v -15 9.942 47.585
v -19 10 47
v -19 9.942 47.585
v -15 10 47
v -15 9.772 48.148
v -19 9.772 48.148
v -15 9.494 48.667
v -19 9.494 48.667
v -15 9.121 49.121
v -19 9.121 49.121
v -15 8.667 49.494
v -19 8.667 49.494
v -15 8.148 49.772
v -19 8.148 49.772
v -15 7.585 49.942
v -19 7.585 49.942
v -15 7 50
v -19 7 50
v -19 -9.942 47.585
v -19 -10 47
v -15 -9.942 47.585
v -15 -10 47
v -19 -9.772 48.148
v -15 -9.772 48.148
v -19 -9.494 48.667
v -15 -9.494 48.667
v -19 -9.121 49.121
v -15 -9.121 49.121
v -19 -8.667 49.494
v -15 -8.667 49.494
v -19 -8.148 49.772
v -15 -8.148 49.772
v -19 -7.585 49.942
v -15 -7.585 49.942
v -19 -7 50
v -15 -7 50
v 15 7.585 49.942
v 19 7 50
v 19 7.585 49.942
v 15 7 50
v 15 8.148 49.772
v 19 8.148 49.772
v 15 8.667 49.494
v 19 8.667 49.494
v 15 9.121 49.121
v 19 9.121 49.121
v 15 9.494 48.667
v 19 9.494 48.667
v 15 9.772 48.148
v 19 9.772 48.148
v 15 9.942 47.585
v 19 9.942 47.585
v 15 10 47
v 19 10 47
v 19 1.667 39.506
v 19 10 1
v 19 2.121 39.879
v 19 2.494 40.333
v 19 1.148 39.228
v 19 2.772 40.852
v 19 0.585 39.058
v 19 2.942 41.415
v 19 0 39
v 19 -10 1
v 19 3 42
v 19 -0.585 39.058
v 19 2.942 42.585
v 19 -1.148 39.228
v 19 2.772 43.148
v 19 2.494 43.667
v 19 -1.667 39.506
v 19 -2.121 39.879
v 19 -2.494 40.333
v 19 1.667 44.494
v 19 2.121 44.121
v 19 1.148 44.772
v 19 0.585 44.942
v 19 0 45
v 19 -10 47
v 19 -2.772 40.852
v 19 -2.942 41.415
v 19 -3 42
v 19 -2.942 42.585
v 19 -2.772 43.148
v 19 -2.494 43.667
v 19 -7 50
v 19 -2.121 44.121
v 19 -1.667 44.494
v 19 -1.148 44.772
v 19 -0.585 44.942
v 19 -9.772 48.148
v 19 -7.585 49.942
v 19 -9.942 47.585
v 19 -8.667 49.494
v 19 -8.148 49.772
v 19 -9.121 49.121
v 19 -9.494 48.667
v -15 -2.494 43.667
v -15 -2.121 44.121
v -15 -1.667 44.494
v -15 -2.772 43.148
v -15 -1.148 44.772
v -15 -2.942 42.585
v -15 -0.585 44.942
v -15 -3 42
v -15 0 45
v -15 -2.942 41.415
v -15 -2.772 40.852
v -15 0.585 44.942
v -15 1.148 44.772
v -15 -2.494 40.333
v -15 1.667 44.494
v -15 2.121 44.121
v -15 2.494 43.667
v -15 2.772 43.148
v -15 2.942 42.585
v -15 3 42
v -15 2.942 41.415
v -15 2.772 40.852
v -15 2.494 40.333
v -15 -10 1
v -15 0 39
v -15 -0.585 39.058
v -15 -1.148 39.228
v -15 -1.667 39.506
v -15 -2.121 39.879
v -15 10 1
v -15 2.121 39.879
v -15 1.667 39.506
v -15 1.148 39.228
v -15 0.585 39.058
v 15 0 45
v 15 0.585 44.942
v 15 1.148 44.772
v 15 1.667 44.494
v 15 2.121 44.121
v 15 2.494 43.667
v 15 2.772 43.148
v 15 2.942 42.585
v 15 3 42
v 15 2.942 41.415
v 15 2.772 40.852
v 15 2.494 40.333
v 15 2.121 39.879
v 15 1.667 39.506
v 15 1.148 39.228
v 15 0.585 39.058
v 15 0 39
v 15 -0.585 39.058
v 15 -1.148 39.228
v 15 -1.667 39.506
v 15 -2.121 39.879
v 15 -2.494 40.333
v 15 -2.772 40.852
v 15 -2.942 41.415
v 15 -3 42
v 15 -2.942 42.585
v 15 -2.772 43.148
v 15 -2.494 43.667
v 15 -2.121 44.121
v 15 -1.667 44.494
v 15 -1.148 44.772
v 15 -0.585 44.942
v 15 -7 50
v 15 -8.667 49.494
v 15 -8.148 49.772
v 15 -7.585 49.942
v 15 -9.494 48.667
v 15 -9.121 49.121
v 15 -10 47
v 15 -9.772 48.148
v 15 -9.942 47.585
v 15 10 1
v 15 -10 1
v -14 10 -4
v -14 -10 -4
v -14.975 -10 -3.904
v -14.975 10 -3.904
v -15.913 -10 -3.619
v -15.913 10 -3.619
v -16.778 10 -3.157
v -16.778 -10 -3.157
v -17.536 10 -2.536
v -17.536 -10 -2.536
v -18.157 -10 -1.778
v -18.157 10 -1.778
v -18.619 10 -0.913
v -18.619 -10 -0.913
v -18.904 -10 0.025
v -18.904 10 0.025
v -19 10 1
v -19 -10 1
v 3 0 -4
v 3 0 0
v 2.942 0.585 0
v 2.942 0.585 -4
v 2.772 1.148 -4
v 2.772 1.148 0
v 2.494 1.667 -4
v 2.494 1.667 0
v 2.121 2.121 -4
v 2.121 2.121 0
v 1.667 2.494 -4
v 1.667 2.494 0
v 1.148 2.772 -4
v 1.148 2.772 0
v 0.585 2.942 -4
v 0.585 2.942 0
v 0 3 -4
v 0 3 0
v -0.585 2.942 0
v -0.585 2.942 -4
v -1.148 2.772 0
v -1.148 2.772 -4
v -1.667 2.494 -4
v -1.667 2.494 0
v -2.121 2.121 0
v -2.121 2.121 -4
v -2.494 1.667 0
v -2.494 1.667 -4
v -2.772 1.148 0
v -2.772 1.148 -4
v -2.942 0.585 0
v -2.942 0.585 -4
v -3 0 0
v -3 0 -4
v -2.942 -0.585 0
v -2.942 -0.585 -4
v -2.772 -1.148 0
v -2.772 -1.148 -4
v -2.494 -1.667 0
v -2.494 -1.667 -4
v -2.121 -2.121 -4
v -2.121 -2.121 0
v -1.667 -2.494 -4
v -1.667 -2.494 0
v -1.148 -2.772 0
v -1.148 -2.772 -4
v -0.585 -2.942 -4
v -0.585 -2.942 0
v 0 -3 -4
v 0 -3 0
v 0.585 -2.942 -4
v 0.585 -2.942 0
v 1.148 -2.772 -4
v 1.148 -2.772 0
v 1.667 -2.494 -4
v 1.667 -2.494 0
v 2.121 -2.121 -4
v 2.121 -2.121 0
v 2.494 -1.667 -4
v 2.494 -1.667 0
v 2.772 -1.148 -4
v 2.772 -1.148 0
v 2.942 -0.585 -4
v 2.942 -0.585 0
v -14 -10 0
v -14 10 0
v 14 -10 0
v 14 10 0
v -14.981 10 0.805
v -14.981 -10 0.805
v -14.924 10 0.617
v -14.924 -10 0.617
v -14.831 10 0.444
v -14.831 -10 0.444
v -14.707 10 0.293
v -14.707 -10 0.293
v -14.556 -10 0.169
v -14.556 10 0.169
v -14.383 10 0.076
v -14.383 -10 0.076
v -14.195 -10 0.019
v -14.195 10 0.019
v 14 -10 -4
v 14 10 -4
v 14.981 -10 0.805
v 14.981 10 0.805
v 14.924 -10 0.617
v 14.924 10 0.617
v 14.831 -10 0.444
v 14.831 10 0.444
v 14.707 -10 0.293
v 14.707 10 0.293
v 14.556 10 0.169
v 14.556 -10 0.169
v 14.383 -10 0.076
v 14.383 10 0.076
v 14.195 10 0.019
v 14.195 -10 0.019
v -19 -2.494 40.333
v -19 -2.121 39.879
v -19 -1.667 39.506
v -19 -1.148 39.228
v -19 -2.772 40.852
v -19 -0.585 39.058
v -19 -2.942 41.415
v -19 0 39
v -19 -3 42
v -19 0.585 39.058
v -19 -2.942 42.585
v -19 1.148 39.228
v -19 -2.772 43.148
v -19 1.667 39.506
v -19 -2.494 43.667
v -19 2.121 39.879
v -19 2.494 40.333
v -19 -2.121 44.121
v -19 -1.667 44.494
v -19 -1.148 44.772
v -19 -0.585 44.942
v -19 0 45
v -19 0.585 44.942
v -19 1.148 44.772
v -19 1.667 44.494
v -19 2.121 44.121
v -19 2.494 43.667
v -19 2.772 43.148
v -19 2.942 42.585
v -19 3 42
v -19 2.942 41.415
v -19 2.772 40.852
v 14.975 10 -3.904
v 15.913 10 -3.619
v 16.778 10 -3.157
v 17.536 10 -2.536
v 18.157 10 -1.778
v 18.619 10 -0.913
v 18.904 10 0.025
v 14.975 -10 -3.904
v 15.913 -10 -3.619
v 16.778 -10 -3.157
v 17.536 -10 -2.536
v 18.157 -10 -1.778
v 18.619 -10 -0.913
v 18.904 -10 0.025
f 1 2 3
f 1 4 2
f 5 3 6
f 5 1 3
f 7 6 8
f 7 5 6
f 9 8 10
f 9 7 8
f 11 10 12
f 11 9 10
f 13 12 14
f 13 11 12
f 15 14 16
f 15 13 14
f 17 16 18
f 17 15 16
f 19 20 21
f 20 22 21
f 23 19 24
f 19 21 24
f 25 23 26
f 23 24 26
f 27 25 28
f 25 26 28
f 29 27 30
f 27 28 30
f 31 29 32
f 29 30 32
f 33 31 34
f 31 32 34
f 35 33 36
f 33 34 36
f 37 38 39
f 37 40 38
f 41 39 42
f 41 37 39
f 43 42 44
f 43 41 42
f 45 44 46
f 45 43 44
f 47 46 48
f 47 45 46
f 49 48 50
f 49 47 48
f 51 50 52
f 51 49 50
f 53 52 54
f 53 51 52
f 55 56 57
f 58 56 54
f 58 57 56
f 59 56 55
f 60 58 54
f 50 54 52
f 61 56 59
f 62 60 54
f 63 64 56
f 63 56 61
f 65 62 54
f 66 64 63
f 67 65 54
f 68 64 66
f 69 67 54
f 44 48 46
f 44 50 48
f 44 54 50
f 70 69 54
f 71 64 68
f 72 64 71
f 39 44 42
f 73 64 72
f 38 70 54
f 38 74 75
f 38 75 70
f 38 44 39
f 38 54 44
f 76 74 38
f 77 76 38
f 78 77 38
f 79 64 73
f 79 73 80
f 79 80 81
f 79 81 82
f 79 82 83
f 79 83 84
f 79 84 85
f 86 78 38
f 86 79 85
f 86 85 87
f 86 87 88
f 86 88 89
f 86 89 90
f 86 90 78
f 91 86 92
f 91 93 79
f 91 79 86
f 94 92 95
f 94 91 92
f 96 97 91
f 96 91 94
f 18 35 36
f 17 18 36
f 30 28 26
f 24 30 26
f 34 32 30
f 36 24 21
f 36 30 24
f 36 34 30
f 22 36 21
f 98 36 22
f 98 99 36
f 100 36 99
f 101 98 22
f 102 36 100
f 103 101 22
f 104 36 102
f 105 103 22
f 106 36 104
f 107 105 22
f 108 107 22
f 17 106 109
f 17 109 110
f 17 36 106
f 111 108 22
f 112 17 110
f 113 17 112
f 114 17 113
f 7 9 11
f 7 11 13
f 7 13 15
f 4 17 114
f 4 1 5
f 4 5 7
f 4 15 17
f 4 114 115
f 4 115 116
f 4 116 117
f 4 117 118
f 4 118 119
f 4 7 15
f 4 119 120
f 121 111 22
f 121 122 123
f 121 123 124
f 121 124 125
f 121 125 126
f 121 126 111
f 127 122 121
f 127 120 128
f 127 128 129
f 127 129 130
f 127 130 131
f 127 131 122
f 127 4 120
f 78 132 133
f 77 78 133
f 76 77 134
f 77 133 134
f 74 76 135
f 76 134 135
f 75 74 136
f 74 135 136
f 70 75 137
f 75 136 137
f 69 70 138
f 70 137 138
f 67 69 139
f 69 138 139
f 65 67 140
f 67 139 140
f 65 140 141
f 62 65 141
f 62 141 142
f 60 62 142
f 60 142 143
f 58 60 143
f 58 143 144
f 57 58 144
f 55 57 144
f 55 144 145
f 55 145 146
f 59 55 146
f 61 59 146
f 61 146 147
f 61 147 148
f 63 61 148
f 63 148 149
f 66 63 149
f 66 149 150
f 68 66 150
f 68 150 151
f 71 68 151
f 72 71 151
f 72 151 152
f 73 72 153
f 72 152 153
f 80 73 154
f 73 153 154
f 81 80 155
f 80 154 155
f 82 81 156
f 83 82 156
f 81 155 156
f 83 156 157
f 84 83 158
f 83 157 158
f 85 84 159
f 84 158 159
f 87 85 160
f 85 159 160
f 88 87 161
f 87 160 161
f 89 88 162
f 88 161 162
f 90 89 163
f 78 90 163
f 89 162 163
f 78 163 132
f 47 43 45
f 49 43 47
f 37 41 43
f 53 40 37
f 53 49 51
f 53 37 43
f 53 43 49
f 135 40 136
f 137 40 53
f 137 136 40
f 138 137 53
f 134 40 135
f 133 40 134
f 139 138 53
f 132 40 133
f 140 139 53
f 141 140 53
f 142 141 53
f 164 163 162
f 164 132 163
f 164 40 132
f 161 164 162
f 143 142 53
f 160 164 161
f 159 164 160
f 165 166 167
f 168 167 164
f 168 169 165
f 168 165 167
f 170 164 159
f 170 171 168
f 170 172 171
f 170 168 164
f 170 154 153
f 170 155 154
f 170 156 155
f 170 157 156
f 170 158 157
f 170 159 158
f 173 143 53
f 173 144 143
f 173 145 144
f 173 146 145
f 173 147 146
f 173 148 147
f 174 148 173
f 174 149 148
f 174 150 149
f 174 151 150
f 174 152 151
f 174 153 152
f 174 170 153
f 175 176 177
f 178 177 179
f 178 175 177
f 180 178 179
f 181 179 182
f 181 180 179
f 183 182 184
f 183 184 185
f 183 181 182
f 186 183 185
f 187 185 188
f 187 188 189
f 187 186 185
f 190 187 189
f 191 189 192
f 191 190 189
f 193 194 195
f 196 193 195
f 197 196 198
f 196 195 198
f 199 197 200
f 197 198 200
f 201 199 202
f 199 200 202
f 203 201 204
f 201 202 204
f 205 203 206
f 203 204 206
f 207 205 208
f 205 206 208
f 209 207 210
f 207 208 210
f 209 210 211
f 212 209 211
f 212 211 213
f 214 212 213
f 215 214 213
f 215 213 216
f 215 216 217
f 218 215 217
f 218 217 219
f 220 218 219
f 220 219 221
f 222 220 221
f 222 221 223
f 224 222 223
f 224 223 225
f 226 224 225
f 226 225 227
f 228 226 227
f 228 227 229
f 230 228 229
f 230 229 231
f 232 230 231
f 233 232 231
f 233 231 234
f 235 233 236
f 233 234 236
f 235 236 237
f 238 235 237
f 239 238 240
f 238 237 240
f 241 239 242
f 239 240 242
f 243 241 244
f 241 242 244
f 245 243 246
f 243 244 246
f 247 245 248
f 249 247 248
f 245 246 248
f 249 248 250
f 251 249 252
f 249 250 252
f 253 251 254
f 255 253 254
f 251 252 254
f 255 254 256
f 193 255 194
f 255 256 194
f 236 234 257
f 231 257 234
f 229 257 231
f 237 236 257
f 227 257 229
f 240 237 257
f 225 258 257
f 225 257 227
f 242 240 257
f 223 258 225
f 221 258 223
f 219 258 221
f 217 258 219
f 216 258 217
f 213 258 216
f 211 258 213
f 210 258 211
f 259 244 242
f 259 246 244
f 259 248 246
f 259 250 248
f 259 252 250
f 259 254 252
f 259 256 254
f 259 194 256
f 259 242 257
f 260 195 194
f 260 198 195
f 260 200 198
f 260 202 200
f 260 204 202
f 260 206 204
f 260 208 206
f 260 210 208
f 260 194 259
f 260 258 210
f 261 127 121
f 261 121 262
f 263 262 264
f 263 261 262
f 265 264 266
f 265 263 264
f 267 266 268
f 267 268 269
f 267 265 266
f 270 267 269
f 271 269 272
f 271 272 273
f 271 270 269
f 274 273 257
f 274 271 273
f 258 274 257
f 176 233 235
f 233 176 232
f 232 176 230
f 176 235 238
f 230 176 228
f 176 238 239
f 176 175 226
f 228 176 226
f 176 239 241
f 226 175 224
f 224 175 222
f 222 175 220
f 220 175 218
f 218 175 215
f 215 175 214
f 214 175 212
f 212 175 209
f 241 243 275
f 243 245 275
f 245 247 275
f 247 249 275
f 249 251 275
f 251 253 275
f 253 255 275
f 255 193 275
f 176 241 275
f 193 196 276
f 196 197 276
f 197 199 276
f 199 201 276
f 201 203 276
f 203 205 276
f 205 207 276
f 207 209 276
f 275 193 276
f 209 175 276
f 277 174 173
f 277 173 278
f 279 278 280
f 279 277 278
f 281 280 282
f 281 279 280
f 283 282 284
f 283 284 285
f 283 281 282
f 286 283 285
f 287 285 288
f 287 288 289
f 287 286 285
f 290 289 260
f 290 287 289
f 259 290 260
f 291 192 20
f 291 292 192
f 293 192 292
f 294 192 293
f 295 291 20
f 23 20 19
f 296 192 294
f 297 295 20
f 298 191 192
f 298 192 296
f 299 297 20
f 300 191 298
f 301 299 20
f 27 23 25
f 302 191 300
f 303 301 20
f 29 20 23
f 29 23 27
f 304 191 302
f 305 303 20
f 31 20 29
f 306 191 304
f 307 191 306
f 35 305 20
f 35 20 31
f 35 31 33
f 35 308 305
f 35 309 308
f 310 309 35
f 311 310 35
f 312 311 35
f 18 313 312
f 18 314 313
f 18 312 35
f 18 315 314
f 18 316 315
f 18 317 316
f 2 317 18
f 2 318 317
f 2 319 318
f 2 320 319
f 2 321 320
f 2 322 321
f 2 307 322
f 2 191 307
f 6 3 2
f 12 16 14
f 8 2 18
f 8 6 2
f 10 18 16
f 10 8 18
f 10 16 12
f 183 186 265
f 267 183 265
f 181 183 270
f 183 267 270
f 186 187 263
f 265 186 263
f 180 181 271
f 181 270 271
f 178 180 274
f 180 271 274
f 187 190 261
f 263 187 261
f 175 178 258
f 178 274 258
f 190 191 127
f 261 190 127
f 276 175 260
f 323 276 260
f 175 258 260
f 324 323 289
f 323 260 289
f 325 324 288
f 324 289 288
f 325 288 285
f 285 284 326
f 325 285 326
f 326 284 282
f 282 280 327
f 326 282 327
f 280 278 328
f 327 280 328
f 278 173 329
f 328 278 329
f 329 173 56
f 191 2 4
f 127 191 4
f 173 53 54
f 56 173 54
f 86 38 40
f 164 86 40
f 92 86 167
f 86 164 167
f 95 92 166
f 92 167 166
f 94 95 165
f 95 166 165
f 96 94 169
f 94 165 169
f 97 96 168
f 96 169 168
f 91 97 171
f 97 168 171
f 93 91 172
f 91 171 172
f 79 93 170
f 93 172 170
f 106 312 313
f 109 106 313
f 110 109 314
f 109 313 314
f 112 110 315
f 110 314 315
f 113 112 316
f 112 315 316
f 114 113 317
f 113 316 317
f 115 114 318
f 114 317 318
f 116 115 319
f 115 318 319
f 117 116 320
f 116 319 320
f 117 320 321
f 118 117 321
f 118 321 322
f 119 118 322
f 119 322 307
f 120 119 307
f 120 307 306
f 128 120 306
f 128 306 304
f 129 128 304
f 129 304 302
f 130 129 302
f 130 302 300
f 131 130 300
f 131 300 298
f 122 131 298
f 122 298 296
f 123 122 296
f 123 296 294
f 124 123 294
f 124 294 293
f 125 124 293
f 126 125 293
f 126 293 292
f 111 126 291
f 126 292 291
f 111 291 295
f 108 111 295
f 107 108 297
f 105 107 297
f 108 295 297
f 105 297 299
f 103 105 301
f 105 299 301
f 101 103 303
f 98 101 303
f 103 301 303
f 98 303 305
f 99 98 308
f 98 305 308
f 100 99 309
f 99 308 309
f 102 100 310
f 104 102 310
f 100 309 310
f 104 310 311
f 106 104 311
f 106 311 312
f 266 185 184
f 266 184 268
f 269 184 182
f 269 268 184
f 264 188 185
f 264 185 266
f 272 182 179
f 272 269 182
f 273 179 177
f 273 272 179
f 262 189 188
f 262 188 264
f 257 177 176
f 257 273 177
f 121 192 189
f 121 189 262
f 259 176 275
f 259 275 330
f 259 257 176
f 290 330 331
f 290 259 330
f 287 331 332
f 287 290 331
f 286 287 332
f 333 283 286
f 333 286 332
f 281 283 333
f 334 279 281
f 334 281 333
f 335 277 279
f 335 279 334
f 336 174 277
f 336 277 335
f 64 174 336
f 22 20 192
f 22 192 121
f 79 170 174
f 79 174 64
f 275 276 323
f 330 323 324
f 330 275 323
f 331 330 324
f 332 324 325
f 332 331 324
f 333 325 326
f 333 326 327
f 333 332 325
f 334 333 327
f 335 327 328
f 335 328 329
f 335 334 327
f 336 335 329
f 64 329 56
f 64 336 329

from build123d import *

# Parameters (mm, degrees)
SKETCH_1_W                         = 30
SKETCH_1_H                         = 20
SM_BASE_FLANGE_1_DEPTH             = 4
SM_EDGE_FLANGE_1_STRIP_W           = 18
SM_EDGE_FLANGE_1_STRIP_H           = 4
SM_EDGE_FLANGE_1_STRIP_CUT_DEPTH   = 20
SM_EDGE_FLANGE_1_STRIP_2_W         = 18
SM_EDGE_FLANGE_1_STRIP_2_H         = 4
SM_EDGE_FLANGE_1_STRIP_CUT_2_DEPTH = 20
SM_EDGE_FLANGE_1_DEPTH             = 20
SM_EDGE_FLANGE_1_BEND_DEPTH        = 20
FILLET_1_R                         = 3
SKETCH_12_R                        = 3
CUT_EXTRUDE_1_DEPTH                = 10
SKETCH_13_R                        = 3
CUT_EXTRUDE_2_DEPTH                = 64.592452382


# Sheet-metal steps are written as plain solids
with BuildPart() as part:
    # Sketch 1 → 基体-法兰1 (new body)
    with BuildSketch(Plane.XY):
        Rectangle(SKETCH_1_W, SKETCH_1_H)
    extrude(amount=-SM_BASE_FLANGE_1_DEPTH)

    # 边线-法兰1 strip (across the edge) → 边线-法兰1 strip cut (cut)
    with BuildSketch(Plane(origin=(-15, 10, 0), x_dir=(1, 0, 0), z_dir=(0, -1, 0))):
        with Locations((-8, -2)):
            Rectangle(SM_EDGE_FLANGE_1_STRIP_W, SM_EDGE_FLANGE_1_STRIP_H)
    extrude(amount=SM_EDGE_FLANGE_1_STRIP_CUT_DEPTH, mode=Mode.SUBTRACT)

    # 边线-法兰1 strip 2 (across the edge) → 边线-法兰1 strip cut 2 (cut)
    with BuildSketch(Plane(origin=(15, -10, 0), x_dir=(-1, 0, 0), z_dir=(0, 1, 0))):
        with Locations((-8, -2)):
            Rectangle(SM_EDGE_FLANGE_1_STRIP_2_W, SM_EDGE_FLANGE_1_STRIP_2_H)
    extrude(amount=SM_EDGE_FLANGE_1_STRIP_CUT_2_DEPTH, mode=Mode.SUBTRACT)

    # 边线-法兰1 section (across the edge) → 边线-法兰1 (add)
    with BuildSketch(Plane(origin=(-15, 10, 0), x_dir=(1, 0, 0), z_dir=(0, -1, 0))):
        with BuildLine():
            Line((-4, 1), (-4, 50))
            Line((-4, 50), (0, 50))
            Line((0, 50), (0, 1))
            ThreePointArc((0, 1), (0.292893219, 0.292893219), (1, 0))
            Line((1, 0), (1, -4))
            ThreePointArc((1, -4), (-2.535533906, -2.535533906), (-4, 1))
        make_face()
    extrude(amount=SM_EDGE_FLANGE_1_DEPTH)

    # 边线-法兰1 section 2 (across the edge) → 边线-法兰1 bend (add)
    with BuildSketch(Plane(origin=(15, -10, 0), x_dir=(-1, 0, 0), z_dir=(0, 1, 0))):
        with BuildLine():
            Line((-4, 1), (-4, 50))
            Line((-4, 50), (0, 50))
            Line((0, 50), (0, 1))
            ThreePointArc((0, 1), (0.292893219, 0.292893219), (1, 0))
            Line((1, 0), (1, -4))
            ThreePointArc((1, -4), (-2.535533906, -2.535533906), (-4, 1))
        make_face()
    extrude(amount=SM_EDGE_FLANGE_1_BEND_DEPTH)

    # 圆角1
    fillet_1_edges = [part.edges().sort_by_distance(p)[0] for p in [
        (-17, 10, 50),
        (-17, -10, 50),
        (17, -10, 50),
        (17, 10, 50),
    ]]
    fillet(fillet_1_edges, radius=FILLET_1_R)

    # 草图12 → 切除-拉伸1 (cut)
    with BuildSketch(Plane.XY):
        Circle(SKETCH_12_R)
    extrude(amount=-CUT_EXTRUDE_1_DEPTH, mode=Mode.SUBTRACT)

    # 草图13 → 切除-拉伸2 (cut, through all)
    with BuildSketch(Plane.ZY.offset(19)):
        with Locations((42, 0)):
            Circle(SKETCH_13_R)
    extrude(amount=-CUT_EXTRUDE_2_DEPTH, mode=Mode.SUBTRACT)


solid = part.part
